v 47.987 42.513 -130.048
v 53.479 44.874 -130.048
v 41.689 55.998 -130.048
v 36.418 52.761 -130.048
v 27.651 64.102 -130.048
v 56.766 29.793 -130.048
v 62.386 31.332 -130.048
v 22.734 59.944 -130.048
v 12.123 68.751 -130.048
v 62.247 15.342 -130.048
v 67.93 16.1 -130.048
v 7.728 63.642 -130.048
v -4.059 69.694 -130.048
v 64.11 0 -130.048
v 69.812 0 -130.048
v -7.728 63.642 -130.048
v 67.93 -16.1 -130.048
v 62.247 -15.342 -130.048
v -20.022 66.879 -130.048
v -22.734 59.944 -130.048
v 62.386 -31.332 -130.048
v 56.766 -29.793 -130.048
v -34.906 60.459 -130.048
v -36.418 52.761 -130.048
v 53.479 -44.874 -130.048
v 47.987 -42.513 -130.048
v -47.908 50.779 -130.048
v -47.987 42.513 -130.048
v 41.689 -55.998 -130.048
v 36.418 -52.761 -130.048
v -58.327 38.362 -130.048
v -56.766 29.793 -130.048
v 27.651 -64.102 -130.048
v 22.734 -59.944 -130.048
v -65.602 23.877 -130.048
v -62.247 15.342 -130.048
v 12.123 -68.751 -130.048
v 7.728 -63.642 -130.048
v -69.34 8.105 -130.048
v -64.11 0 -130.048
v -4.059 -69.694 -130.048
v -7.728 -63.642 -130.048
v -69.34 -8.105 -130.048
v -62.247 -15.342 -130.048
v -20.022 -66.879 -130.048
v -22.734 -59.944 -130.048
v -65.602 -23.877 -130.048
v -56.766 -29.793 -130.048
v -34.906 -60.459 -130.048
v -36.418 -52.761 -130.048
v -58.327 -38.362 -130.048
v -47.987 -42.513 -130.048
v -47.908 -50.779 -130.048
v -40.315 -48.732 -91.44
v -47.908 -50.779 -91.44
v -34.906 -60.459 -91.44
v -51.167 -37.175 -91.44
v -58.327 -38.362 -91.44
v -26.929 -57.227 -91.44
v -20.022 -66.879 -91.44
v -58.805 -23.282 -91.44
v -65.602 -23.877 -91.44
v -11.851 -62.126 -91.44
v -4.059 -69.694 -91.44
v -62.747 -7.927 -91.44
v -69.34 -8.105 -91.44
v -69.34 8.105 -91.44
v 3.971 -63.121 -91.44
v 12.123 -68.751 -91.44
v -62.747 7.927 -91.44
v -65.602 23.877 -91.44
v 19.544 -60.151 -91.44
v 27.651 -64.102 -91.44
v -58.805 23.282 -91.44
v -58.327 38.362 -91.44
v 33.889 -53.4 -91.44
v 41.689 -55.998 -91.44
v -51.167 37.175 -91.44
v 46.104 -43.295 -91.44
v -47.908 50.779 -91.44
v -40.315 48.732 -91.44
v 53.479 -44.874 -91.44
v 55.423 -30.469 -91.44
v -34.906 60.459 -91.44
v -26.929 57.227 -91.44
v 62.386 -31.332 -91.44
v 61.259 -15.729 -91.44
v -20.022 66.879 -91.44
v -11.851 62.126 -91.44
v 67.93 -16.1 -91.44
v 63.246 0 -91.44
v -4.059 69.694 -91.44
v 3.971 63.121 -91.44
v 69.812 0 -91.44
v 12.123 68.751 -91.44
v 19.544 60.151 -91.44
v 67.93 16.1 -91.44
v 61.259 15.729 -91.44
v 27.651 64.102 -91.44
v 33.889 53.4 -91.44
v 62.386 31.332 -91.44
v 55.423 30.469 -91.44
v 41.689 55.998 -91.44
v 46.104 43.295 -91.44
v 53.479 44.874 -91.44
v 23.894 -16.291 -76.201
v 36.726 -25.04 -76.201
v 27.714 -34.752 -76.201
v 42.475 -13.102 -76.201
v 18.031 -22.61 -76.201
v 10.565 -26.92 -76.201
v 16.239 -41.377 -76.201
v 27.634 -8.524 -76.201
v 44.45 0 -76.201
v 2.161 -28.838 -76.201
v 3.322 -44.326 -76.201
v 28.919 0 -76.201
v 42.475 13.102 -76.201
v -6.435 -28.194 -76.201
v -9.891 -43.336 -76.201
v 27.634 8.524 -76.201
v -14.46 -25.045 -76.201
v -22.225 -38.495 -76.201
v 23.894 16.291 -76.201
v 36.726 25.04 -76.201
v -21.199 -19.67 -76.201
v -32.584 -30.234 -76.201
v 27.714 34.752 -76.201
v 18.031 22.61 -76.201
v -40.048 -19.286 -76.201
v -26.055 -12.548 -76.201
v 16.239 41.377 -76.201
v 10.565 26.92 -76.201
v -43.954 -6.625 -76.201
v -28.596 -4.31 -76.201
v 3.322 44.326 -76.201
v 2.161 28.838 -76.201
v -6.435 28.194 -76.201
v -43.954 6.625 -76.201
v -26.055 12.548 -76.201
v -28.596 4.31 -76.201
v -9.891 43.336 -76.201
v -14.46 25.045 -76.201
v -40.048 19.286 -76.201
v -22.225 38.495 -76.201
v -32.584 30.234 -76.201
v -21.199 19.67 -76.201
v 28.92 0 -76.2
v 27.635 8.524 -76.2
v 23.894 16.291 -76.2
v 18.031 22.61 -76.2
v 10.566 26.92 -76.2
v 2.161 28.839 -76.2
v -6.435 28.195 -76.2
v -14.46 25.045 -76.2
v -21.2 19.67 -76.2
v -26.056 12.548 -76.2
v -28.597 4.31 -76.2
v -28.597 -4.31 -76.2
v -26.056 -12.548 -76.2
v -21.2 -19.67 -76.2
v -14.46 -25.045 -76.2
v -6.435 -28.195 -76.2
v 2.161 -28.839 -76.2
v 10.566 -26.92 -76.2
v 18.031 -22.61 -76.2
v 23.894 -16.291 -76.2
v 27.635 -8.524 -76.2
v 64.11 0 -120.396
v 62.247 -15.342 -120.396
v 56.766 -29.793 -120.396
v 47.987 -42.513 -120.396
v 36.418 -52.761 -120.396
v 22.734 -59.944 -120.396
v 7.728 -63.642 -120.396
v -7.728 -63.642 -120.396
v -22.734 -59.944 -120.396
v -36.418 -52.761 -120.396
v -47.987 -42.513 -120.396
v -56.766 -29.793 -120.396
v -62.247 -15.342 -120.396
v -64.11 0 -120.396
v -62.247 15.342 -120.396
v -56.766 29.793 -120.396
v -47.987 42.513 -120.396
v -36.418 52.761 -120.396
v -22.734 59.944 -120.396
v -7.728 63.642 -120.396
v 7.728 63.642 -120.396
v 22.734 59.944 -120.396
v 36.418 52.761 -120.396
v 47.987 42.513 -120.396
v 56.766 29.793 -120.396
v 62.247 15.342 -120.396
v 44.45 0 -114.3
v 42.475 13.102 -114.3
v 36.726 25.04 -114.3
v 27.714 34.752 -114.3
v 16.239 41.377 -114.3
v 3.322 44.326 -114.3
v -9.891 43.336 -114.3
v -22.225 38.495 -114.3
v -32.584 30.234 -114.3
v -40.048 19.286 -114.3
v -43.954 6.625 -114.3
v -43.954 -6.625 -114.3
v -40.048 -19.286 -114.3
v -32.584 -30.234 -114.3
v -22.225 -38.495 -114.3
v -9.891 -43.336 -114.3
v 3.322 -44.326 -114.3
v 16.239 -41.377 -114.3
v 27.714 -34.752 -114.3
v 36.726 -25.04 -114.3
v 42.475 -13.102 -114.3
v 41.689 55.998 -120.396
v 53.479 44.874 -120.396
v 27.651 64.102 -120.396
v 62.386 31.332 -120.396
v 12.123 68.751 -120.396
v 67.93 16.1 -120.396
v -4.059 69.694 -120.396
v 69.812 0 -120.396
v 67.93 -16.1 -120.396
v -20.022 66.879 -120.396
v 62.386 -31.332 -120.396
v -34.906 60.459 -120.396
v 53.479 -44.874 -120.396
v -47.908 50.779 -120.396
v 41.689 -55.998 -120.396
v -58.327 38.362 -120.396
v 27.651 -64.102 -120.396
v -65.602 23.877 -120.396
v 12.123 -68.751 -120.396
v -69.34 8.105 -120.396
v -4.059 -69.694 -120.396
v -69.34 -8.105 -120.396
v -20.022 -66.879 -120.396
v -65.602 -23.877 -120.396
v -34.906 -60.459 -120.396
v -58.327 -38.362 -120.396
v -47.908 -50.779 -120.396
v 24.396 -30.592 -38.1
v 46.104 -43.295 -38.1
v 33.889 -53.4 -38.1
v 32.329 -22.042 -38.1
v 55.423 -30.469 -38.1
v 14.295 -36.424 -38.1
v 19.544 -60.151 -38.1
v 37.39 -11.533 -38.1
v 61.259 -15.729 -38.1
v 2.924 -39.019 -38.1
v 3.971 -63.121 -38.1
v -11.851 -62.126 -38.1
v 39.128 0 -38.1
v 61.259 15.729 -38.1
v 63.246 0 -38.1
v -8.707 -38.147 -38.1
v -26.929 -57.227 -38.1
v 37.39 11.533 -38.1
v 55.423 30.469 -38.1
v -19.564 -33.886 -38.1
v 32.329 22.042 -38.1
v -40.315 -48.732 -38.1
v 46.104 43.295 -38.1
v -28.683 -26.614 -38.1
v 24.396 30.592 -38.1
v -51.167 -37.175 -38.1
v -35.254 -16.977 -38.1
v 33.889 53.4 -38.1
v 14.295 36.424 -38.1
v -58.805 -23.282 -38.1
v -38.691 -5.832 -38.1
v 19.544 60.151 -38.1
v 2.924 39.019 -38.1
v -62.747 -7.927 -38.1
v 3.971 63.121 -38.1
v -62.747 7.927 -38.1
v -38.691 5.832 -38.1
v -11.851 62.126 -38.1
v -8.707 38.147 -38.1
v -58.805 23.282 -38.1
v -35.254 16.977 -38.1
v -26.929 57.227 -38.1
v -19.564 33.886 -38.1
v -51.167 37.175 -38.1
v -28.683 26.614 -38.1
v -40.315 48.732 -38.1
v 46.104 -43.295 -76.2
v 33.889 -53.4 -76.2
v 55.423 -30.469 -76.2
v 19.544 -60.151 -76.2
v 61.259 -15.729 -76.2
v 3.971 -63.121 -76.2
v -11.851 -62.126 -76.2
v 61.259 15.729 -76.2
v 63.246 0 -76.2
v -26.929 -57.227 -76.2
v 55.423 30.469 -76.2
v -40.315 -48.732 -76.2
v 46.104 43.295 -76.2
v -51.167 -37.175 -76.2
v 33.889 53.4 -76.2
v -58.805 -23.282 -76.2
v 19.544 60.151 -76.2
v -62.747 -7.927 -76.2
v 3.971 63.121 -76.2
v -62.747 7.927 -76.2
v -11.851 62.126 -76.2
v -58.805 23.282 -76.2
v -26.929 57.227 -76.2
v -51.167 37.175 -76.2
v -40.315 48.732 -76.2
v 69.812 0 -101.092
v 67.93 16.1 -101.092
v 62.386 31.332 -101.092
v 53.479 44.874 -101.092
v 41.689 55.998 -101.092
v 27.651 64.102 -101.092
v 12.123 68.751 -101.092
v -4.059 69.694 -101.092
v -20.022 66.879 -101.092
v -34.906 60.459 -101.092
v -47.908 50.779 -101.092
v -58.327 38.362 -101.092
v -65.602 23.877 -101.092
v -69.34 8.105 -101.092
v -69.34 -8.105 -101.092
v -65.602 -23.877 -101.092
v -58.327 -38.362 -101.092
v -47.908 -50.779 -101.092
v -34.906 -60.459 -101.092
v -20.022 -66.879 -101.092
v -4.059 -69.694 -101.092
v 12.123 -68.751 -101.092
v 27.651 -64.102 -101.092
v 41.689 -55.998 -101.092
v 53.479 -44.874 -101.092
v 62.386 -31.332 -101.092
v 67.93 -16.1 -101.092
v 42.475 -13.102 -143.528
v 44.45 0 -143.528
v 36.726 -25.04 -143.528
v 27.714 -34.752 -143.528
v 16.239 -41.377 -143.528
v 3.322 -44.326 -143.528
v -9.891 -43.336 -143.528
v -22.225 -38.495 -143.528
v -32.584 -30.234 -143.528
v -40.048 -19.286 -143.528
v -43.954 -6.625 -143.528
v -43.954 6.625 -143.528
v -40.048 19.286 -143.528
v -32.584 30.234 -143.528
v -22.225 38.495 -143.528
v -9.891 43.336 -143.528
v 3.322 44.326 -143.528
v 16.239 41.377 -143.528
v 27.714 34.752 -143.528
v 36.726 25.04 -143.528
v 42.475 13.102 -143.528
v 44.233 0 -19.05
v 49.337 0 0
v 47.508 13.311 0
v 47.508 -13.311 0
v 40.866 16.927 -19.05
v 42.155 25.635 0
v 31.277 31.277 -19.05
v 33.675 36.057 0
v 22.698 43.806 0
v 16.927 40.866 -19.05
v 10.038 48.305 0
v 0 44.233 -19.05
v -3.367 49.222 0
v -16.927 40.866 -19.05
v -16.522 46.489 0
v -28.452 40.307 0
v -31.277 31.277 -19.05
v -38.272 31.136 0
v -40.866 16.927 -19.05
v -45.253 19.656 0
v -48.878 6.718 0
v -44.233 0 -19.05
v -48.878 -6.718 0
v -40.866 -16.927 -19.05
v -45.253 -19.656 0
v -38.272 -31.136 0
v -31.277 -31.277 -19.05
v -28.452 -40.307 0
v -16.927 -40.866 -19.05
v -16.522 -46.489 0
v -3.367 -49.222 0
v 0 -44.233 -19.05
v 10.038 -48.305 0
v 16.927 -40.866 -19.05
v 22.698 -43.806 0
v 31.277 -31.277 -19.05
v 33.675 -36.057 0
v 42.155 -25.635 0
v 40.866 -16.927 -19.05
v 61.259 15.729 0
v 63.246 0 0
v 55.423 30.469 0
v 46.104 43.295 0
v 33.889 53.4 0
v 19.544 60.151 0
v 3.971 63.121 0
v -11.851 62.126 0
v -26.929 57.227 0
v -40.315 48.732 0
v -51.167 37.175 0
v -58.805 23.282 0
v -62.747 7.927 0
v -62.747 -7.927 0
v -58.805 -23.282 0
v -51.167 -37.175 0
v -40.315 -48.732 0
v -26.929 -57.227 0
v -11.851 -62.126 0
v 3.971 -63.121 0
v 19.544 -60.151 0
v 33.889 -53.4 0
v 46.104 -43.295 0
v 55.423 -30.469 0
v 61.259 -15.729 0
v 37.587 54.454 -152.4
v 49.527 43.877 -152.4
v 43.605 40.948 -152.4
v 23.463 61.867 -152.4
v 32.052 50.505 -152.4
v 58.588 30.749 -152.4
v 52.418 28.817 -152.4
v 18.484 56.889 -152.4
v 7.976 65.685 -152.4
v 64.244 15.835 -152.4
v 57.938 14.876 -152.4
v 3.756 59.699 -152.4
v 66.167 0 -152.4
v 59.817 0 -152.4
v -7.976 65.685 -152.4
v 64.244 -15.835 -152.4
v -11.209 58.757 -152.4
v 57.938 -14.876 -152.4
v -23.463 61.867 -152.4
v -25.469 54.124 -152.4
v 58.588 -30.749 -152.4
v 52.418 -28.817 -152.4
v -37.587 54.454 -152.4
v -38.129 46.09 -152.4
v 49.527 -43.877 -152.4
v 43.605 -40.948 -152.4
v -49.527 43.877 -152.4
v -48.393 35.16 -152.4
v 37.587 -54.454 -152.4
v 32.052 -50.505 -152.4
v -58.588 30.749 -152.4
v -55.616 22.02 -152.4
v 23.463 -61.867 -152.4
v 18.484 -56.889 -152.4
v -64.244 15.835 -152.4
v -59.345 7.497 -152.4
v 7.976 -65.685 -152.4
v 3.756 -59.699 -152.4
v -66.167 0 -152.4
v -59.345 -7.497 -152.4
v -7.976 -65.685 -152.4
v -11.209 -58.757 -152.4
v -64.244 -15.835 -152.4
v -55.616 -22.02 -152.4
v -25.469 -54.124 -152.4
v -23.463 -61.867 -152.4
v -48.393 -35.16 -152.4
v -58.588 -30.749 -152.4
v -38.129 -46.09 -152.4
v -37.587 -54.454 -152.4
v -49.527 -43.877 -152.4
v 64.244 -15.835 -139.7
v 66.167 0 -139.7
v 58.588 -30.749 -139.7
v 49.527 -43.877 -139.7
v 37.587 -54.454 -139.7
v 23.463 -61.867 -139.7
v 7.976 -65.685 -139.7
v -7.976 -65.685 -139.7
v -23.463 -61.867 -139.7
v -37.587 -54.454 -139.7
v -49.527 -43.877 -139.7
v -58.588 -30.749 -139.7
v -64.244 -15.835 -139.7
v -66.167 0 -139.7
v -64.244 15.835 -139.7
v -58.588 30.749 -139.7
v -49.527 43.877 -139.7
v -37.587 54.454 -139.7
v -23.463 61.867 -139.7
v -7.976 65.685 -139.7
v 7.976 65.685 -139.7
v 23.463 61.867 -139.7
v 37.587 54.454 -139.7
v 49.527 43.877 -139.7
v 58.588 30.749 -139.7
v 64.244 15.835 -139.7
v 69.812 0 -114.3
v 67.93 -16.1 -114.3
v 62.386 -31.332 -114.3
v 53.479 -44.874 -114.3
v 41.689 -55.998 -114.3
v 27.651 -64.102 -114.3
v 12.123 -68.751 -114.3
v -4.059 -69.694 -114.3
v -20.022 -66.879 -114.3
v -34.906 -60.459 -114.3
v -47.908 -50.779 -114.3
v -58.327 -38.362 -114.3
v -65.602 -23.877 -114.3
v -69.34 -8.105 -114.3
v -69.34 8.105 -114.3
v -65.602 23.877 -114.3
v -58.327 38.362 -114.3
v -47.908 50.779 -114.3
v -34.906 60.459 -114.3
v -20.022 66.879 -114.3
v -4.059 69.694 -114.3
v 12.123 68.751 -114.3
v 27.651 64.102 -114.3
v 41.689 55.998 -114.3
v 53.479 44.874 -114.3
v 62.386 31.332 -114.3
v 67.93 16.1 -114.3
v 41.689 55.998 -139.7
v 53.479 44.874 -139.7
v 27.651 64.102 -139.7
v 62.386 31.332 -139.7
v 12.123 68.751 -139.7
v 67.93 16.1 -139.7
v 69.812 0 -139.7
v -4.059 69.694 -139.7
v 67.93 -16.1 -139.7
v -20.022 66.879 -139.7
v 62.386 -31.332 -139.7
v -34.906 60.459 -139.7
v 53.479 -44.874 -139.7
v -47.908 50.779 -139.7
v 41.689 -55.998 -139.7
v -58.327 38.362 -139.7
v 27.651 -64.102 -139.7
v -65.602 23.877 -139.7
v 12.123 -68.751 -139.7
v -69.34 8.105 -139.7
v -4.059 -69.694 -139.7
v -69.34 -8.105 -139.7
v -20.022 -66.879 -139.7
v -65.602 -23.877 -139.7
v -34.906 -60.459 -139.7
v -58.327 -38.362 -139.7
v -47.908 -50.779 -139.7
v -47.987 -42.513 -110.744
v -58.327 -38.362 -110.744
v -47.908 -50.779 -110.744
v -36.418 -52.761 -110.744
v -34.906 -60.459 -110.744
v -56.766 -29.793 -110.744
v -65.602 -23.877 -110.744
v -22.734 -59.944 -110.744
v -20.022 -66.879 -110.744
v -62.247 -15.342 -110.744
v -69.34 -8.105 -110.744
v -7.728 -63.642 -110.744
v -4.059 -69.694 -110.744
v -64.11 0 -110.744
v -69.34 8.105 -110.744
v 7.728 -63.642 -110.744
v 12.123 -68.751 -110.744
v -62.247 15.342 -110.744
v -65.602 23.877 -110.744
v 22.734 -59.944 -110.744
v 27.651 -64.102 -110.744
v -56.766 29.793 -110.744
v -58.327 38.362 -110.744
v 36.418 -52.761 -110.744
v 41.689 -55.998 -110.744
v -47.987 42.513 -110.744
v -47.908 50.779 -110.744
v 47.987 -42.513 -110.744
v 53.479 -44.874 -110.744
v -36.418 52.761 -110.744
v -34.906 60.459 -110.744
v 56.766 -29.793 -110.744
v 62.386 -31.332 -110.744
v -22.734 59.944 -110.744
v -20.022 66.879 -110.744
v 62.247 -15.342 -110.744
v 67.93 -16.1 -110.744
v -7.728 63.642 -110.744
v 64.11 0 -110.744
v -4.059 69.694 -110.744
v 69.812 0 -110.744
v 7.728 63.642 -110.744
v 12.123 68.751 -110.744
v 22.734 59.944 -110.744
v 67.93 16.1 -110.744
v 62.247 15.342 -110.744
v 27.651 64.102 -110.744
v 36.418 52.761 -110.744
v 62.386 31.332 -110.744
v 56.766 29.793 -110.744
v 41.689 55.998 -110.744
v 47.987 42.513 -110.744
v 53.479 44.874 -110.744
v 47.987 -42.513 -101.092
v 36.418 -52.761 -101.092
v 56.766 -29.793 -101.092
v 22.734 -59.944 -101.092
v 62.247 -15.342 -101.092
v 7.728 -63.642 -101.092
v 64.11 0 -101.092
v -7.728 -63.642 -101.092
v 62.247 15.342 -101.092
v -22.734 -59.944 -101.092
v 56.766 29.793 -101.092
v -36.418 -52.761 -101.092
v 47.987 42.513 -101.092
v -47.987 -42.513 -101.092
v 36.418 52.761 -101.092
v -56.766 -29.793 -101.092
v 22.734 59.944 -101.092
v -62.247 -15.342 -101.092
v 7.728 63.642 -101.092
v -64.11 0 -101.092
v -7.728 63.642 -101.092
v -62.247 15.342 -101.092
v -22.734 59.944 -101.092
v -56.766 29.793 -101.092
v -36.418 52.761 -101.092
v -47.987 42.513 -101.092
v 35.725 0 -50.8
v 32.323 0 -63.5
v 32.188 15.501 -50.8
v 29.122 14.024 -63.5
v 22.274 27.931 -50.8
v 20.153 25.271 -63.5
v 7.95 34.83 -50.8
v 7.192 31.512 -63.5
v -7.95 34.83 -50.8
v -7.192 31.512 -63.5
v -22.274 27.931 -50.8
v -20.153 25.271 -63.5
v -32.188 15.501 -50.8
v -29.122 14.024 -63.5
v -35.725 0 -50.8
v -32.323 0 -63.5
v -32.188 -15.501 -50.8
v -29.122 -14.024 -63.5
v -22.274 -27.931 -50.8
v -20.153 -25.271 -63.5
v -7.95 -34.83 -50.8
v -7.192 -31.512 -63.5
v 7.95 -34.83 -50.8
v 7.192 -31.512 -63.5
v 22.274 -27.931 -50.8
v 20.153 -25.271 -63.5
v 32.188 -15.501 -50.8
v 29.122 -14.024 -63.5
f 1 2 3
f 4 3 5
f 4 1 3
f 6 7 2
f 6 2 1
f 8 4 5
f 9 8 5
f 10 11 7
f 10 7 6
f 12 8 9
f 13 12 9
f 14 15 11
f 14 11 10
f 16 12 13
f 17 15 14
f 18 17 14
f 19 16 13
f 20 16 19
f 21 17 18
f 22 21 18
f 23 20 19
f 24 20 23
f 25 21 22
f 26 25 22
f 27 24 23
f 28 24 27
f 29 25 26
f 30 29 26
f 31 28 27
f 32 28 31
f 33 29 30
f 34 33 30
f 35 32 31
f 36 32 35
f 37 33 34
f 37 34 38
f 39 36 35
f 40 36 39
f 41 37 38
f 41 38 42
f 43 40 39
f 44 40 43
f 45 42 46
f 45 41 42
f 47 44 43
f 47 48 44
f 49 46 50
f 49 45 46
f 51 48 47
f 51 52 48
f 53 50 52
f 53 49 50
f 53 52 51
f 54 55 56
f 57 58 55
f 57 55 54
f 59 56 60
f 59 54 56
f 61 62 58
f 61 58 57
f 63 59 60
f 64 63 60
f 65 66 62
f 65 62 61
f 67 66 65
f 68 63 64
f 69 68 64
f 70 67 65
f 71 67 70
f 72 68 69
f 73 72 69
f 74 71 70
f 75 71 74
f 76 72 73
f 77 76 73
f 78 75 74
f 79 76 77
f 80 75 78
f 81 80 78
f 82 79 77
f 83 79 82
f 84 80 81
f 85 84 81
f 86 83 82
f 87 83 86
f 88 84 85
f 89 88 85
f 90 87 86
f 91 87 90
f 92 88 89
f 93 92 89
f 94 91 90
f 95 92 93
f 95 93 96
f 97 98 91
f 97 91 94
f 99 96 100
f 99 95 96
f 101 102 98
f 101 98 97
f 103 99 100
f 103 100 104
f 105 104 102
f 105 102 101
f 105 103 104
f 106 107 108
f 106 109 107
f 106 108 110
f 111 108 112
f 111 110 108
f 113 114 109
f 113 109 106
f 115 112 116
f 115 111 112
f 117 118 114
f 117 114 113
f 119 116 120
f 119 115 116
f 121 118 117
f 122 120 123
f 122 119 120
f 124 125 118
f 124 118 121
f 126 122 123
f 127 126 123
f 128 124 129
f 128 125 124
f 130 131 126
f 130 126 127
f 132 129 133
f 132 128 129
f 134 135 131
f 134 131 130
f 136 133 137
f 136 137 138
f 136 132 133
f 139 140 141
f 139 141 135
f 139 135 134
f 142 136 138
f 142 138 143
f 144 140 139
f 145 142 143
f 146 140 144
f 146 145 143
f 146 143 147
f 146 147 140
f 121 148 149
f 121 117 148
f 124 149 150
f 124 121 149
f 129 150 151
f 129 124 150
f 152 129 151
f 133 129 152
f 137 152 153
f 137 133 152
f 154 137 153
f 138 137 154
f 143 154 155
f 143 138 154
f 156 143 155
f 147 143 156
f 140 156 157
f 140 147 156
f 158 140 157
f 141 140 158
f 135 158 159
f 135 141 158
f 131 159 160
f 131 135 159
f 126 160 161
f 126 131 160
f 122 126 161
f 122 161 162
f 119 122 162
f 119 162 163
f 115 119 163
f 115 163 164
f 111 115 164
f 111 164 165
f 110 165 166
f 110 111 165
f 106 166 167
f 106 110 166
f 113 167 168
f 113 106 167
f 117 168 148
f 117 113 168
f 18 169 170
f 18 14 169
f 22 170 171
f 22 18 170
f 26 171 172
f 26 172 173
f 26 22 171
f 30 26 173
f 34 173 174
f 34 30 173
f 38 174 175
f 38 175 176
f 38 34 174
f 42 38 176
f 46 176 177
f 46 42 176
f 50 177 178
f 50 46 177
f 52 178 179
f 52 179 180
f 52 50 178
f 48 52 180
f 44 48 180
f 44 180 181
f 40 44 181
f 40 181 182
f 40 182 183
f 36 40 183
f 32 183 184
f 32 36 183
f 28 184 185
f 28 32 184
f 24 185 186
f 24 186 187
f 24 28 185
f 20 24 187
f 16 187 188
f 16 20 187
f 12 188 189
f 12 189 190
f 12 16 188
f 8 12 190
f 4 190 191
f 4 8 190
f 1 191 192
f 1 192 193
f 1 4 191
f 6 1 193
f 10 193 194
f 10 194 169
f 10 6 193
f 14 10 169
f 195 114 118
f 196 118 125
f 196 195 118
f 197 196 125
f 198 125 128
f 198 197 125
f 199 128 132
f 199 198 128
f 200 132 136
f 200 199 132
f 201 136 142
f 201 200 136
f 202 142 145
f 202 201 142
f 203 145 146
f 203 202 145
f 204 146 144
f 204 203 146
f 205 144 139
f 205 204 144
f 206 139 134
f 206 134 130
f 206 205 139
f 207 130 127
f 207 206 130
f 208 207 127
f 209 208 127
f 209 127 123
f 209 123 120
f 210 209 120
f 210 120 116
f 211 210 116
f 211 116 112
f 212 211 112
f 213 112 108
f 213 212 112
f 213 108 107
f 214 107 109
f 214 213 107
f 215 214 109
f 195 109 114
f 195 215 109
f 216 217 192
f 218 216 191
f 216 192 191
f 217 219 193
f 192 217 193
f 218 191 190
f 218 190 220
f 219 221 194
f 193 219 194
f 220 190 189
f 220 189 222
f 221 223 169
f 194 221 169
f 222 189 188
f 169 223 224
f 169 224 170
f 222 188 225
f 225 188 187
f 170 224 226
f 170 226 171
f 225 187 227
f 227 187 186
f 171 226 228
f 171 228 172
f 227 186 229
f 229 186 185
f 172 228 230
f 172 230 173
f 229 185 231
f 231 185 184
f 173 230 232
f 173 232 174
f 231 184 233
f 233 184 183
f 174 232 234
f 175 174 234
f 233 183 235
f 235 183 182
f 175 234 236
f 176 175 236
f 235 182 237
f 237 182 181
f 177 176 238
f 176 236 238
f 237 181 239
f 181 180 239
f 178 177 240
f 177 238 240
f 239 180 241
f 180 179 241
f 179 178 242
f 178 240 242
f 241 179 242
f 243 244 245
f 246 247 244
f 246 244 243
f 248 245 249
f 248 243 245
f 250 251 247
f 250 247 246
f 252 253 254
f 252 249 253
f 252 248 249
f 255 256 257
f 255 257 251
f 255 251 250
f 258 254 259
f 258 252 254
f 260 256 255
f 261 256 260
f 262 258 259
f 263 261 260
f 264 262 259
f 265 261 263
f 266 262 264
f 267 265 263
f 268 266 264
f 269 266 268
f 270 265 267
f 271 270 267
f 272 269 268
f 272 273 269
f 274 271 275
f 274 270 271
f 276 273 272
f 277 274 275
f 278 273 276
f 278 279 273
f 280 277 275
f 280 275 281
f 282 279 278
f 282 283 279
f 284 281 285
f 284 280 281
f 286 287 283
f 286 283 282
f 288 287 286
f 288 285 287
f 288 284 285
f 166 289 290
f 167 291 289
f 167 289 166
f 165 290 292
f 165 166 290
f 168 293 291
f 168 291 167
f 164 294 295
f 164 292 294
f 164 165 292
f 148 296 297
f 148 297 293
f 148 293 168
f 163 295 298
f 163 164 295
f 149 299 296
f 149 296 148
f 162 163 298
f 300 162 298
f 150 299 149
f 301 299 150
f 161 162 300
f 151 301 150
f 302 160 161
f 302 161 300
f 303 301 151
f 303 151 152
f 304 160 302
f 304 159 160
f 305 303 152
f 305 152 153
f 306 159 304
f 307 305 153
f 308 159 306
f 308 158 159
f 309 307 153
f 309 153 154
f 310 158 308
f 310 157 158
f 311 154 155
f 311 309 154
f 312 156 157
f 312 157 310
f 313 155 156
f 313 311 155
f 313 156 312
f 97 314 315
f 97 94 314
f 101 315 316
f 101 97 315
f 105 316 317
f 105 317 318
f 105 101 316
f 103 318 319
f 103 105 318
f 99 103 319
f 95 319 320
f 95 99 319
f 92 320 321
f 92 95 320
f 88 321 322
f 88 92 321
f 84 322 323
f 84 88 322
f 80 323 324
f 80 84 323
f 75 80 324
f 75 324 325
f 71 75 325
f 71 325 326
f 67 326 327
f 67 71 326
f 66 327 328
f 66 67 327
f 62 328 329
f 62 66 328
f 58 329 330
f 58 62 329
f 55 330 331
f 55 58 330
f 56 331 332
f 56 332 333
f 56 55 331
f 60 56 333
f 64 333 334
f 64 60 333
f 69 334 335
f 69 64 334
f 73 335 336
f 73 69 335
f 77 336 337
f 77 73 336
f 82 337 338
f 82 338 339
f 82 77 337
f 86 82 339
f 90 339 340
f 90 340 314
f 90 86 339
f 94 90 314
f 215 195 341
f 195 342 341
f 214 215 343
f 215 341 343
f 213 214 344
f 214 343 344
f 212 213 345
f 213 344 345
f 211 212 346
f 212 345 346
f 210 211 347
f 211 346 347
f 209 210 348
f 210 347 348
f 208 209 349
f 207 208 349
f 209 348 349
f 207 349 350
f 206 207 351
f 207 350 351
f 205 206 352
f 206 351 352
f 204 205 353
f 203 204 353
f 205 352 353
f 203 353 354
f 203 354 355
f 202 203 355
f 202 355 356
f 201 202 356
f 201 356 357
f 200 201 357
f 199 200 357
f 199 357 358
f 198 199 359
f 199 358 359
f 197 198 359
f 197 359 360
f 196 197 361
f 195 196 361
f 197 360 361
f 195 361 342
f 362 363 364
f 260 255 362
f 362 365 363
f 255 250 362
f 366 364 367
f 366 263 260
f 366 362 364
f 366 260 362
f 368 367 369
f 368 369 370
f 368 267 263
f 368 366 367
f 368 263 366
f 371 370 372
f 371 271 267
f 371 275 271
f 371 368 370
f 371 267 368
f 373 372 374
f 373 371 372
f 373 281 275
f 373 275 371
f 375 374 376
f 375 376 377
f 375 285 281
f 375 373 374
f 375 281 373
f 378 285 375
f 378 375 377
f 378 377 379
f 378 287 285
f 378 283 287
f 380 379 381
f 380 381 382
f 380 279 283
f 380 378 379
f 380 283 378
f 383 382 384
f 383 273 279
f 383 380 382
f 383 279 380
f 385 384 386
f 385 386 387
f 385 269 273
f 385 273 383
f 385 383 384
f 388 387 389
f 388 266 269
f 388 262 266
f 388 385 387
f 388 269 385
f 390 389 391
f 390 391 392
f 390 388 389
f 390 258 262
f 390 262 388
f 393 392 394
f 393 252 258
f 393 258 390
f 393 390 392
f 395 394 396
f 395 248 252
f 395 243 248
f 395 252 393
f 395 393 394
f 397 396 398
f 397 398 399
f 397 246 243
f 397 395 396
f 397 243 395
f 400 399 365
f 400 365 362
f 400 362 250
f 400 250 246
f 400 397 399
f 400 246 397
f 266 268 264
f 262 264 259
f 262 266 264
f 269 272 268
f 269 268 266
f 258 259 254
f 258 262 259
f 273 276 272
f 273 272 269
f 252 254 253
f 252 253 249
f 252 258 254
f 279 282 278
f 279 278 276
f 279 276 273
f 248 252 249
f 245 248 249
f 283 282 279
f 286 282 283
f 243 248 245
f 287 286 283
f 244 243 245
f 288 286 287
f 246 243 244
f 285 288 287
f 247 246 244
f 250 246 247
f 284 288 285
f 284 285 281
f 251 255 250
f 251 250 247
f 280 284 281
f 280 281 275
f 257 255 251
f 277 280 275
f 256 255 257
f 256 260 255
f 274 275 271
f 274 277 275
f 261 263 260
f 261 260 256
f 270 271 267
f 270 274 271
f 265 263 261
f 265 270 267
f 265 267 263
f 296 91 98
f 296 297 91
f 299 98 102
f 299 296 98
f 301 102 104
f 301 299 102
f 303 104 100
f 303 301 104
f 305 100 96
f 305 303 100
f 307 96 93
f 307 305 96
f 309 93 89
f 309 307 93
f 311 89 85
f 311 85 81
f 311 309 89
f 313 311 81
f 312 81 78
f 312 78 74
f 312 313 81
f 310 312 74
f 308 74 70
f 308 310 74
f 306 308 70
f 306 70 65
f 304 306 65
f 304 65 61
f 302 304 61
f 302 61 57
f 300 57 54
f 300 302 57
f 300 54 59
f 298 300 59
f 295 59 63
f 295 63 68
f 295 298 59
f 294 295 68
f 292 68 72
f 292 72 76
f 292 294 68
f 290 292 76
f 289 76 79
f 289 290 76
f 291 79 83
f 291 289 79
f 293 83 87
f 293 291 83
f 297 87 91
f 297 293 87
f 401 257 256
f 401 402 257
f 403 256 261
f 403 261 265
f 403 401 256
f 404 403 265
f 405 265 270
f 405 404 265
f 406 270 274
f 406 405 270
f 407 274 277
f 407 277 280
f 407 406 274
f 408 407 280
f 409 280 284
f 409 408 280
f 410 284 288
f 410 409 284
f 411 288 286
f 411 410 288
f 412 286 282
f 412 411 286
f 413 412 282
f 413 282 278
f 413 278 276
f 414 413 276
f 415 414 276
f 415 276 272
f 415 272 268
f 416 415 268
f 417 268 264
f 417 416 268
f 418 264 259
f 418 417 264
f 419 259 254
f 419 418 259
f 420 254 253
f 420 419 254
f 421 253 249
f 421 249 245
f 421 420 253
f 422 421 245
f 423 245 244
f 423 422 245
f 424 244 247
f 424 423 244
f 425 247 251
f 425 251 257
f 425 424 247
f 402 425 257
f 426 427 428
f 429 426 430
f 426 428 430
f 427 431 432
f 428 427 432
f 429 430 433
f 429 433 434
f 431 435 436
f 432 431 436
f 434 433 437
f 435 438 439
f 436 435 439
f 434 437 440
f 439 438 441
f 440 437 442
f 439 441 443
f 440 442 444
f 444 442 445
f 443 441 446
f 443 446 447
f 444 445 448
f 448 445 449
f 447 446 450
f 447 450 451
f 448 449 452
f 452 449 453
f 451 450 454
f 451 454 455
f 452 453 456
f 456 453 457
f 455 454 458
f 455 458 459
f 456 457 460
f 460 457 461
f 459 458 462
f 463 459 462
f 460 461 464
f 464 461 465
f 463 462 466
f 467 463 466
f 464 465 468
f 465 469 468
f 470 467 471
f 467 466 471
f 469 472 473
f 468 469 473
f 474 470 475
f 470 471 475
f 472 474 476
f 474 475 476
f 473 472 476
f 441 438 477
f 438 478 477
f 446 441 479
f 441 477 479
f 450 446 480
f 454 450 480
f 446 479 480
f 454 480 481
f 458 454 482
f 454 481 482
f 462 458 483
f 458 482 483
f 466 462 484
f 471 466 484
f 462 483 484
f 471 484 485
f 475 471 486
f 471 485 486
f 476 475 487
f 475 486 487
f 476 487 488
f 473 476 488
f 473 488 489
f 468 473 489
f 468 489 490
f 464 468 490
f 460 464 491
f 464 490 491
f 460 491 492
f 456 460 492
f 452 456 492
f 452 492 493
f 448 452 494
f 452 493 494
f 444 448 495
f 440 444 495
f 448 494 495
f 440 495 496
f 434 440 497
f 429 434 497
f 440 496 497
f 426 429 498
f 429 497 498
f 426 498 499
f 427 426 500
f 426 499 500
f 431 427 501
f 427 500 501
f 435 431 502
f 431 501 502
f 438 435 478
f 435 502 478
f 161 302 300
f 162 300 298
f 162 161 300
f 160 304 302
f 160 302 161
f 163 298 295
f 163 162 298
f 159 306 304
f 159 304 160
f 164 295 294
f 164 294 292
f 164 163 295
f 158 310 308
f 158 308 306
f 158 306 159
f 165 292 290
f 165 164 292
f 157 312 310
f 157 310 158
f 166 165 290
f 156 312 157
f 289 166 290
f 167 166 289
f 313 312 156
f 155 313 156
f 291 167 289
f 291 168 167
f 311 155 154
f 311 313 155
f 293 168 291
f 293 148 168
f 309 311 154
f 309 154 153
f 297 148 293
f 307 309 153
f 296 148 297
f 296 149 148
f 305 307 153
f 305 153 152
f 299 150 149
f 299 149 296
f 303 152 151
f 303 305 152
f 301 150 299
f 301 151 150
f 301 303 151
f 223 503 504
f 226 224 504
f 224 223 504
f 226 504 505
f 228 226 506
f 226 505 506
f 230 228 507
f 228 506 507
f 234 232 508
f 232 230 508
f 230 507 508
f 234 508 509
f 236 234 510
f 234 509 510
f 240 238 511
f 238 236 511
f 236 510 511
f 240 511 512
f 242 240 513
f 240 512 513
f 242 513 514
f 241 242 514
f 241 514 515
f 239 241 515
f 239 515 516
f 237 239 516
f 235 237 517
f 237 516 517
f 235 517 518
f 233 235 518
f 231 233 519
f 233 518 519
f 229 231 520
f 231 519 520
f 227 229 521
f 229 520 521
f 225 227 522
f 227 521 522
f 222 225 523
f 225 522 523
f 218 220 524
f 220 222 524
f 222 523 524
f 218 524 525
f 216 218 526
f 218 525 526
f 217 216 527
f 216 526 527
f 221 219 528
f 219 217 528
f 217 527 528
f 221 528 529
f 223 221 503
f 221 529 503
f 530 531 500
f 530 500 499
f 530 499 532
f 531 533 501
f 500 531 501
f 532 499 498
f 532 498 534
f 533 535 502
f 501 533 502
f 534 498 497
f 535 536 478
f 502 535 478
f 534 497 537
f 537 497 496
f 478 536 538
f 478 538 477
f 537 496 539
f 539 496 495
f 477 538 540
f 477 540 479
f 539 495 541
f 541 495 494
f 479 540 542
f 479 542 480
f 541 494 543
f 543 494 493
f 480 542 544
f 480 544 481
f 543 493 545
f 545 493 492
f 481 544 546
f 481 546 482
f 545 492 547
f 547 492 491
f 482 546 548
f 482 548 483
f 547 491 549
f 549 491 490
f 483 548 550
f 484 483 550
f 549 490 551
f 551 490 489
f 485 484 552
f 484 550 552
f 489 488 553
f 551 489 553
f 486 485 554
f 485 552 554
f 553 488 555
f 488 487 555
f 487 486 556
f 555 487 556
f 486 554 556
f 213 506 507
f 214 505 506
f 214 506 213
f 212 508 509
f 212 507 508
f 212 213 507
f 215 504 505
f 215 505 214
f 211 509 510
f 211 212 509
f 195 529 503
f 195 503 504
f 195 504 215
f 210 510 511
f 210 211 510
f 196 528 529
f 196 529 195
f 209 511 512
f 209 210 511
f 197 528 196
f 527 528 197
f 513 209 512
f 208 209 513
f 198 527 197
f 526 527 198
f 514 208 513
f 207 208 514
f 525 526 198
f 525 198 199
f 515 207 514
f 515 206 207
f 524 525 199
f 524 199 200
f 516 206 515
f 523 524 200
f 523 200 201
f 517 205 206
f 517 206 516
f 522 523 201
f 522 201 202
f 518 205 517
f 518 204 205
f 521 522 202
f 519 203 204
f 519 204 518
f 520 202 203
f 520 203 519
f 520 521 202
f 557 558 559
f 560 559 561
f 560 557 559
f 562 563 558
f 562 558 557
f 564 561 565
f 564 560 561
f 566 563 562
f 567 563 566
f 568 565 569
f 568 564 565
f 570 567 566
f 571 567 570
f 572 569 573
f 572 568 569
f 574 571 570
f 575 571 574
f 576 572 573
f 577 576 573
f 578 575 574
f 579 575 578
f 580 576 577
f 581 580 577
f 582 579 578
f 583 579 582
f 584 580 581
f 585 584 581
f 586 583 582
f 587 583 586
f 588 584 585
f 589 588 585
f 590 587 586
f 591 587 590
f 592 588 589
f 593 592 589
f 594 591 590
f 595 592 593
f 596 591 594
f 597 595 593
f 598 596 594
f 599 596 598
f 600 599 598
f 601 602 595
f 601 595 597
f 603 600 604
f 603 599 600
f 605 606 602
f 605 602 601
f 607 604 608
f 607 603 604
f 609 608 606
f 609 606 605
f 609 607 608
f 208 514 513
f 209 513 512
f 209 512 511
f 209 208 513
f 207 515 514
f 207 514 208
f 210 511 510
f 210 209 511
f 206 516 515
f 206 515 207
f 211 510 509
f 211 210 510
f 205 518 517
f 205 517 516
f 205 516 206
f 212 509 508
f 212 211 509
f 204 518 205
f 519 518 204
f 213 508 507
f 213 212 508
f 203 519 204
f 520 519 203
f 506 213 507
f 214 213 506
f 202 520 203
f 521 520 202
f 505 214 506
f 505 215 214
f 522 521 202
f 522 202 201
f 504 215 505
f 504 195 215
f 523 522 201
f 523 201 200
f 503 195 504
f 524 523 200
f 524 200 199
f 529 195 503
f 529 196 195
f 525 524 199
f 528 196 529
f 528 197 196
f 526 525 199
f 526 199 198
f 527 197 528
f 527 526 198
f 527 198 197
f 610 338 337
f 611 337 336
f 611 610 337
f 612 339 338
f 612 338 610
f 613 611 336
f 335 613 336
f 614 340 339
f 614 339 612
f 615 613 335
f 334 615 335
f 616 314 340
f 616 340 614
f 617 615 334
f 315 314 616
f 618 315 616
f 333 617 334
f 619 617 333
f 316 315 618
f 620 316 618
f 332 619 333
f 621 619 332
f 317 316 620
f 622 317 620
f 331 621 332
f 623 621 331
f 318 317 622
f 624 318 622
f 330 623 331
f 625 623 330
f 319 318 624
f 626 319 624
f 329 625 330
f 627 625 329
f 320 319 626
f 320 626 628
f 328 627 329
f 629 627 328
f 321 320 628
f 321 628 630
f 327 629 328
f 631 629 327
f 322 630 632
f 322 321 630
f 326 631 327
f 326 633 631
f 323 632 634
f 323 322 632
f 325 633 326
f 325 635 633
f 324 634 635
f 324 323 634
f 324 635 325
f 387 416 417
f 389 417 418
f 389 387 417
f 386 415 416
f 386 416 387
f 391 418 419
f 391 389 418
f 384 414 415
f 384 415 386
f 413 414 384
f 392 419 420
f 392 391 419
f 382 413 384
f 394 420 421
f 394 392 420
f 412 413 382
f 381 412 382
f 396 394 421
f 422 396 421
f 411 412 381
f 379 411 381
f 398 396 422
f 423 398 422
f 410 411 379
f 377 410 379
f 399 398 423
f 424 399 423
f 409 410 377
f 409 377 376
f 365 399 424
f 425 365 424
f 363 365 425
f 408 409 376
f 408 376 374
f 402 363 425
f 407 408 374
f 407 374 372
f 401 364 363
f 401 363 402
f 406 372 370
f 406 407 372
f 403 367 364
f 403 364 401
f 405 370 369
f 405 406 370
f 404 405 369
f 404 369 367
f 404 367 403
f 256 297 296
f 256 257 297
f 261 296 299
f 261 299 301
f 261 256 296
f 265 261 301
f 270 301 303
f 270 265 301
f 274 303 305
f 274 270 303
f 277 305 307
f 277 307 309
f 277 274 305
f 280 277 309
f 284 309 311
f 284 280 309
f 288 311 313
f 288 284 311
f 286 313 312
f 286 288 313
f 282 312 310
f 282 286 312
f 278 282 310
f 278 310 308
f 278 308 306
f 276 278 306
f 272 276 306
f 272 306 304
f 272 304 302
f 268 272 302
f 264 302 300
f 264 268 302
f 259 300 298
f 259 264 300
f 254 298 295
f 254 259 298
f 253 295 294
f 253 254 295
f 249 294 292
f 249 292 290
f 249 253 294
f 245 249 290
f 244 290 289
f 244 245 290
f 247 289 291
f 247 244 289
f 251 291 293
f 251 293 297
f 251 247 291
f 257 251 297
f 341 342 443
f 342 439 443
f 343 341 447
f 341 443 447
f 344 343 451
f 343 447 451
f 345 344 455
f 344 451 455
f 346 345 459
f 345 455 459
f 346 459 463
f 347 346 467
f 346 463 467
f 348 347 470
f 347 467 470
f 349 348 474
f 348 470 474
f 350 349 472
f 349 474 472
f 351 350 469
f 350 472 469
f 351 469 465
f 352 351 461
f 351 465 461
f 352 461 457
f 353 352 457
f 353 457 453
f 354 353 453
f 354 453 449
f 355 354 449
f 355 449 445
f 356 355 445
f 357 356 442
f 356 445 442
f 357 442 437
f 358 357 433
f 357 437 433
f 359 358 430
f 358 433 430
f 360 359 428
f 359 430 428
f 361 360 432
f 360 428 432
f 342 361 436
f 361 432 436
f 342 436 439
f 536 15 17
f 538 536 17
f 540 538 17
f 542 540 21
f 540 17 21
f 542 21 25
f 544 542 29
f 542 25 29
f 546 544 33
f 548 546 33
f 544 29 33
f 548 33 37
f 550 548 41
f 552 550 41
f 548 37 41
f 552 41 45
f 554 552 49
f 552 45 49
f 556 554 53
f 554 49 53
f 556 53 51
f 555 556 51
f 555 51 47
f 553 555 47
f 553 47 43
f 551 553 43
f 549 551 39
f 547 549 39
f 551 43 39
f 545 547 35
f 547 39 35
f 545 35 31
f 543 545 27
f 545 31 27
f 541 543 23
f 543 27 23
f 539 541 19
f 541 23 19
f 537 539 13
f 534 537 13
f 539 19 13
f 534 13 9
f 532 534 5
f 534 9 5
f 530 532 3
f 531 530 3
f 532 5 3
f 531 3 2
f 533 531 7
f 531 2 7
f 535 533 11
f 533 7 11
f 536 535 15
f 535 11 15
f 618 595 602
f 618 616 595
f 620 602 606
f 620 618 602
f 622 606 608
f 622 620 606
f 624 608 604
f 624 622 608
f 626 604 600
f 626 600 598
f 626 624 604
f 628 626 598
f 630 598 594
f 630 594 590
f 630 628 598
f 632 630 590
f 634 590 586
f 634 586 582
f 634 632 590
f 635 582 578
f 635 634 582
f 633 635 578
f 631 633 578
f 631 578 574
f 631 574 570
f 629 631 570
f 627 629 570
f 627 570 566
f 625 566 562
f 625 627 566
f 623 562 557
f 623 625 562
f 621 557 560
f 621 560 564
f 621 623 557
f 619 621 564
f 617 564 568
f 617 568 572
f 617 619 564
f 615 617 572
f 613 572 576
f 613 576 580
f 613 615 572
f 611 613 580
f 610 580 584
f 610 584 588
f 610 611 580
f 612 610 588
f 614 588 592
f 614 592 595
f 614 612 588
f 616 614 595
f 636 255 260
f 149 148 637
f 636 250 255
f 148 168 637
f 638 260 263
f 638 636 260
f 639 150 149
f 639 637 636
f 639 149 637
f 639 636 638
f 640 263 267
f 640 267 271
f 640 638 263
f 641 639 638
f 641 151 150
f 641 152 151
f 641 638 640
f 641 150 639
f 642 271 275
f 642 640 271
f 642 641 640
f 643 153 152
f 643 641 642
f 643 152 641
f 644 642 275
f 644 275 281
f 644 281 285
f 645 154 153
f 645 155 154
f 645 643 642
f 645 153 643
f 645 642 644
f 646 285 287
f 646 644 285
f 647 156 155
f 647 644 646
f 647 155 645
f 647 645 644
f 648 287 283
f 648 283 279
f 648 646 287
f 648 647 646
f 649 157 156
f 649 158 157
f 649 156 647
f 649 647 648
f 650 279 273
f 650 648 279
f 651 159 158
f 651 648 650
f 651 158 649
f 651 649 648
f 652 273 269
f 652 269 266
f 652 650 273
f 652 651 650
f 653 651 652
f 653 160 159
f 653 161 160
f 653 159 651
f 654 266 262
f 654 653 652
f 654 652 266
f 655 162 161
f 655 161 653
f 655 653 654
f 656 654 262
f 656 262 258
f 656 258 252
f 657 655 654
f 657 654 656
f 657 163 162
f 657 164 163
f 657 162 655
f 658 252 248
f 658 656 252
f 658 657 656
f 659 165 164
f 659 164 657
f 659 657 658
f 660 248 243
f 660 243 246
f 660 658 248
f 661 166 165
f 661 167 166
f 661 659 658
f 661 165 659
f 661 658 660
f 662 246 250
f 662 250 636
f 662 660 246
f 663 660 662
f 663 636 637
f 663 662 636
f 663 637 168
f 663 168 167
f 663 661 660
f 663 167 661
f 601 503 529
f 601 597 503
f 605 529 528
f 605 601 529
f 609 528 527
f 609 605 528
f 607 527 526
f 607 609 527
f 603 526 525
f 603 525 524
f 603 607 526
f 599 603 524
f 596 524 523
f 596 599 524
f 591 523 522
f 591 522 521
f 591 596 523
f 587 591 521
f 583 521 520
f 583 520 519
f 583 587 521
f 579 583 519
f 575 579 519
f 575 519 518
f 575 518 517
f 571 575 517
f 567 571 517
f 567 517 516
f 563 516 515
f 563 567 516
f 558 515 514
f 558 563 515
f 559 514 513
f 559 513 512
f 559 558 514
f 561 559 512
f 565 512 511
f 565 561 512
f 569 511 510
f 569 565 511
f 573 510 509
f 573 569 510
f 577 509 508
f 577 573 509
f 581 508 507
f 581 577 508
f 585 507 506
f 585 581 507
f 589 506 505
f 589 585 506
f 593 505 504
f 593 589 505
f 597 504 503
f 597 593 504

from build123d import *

# Parameters (mm, degrees)
SKETCH2_W        = 6.35
SKETCH2_H        = 9.652
SKETCH3_W        = 44.45
SKETCH3_H        = 76.198690687
SPLIT1_START     = -114.3
SPLIT1_OUTLINE_R = 69.8119
SPLIT1_DEPTH     = 114.3


# Read off the part's stored shape, not the designer's step: Split1
with BuildPart() as part:
    # Sketch1 → Revolve1 (revolve)
    with BuildSketch(Plane(origin=(0, 0, 0), x_dir=(1, 0, 0), z_dir=(0, 1, 0))):
        Polygon((69.8119, 139.7), (69.8119, 91.44), (63.246, 91.44), (63.246, 0), (49.337302706, 0), (17.145, 120.143309313), (17.145, 127.763309313), (59.817, 152.4), (66.167, 152.4), (66.167, 139.7), align=None)
    revolve(axis=Axis((0, 0, 8.145225657), (0, 0, -1)))

    # Sketch2 → Cut-Revolve1 (revolve, cut)
    with BuildSketch(Plane(origin=(0, 0, 0), x_dir=(1, 0, 0), z_dir=(0, 1, 0))):
        with Locations((67.2846, 125.222)):
            Rectangle(SKETCH2_W, SKETCH2_H)
        with Locations((67.2846, 105.918)):
            Rectangle(SKETCH2_W, SKETCH2_H)
    revolve(axis=Axis((0, 0, 8.145225657), (0, 0, -1)), mode=Mode.SUBTRACT)

    # Sketch3 → Cut-Revolve2 (revolve, cut)
    with BuildSketch(Plane(origin=(0, 0, 0), x_dir=(1, 0, 0), z_dir=(0, 1, 0))):
        with Locations((22.225, 114.300654657)):
            Rectangle(SKETCH3_W, SKETCH3_H)
    revolve(axis=Axis((0, 0, 8.145225657), (0, 0, -1)), mode=Mode.SUBTRACT)

    # Split1 outline → Split1 (cut)
    with BuildSketch(Plane.XY.offset(SPLIT1_START)):
        Circle(SPLIT1_OUTLINE_R)
    extrude(amount=SPLIT1_DEPTH, mode=Mode.SUBTRACT)


with BuildPart() as body_2:
    # Split1 2 outline → Split1 2 (revolve)
    with BuildSketch(Plane.XZ):
        Polygon((39.128438475, -38.1), (28.919574243, -76.2), (63.246, -76.2), (63.246, -38.1), align=None)
    revolve(axis=Axis((0, 0, 0), (0, 0, 1)))


with BuildPart() as body_3:
    # Split1 3 outline → Split1 3 (revolve)
    with BuildSketch(Plane.XZ):
        Polygon((49.337302706, 0), (39.128438475, -38.1), (63.246, -38.1), (63.246, 0), align=None)
    revolve(axis=Axis((0, 0, 0), (0, 0, 1)))


with BuildPart() as body_4:
    # Split1 4 outline → Split1 4 (revolve)
    with BuildSketch(Plane.XZ):
        Polygon((44.45, -76.201309313), (44.45, -114.3), (69.8119, -114.3), (69.8119, -110.744), (64.1096, -110.744), (64.1096, -101.092), (69.8119, -101.092), (69.8119, -91.44), (63.246, -91.44), (63.246, -76.2), (28.919574243, -76.2), (28.919223414, -76.201309313), align=None)
    revolve(axis=Axis((0, 0, 0), (0, 0, 1)))


solid = Compound([part.part, body_2.part, body_3.part, body_4.part])
